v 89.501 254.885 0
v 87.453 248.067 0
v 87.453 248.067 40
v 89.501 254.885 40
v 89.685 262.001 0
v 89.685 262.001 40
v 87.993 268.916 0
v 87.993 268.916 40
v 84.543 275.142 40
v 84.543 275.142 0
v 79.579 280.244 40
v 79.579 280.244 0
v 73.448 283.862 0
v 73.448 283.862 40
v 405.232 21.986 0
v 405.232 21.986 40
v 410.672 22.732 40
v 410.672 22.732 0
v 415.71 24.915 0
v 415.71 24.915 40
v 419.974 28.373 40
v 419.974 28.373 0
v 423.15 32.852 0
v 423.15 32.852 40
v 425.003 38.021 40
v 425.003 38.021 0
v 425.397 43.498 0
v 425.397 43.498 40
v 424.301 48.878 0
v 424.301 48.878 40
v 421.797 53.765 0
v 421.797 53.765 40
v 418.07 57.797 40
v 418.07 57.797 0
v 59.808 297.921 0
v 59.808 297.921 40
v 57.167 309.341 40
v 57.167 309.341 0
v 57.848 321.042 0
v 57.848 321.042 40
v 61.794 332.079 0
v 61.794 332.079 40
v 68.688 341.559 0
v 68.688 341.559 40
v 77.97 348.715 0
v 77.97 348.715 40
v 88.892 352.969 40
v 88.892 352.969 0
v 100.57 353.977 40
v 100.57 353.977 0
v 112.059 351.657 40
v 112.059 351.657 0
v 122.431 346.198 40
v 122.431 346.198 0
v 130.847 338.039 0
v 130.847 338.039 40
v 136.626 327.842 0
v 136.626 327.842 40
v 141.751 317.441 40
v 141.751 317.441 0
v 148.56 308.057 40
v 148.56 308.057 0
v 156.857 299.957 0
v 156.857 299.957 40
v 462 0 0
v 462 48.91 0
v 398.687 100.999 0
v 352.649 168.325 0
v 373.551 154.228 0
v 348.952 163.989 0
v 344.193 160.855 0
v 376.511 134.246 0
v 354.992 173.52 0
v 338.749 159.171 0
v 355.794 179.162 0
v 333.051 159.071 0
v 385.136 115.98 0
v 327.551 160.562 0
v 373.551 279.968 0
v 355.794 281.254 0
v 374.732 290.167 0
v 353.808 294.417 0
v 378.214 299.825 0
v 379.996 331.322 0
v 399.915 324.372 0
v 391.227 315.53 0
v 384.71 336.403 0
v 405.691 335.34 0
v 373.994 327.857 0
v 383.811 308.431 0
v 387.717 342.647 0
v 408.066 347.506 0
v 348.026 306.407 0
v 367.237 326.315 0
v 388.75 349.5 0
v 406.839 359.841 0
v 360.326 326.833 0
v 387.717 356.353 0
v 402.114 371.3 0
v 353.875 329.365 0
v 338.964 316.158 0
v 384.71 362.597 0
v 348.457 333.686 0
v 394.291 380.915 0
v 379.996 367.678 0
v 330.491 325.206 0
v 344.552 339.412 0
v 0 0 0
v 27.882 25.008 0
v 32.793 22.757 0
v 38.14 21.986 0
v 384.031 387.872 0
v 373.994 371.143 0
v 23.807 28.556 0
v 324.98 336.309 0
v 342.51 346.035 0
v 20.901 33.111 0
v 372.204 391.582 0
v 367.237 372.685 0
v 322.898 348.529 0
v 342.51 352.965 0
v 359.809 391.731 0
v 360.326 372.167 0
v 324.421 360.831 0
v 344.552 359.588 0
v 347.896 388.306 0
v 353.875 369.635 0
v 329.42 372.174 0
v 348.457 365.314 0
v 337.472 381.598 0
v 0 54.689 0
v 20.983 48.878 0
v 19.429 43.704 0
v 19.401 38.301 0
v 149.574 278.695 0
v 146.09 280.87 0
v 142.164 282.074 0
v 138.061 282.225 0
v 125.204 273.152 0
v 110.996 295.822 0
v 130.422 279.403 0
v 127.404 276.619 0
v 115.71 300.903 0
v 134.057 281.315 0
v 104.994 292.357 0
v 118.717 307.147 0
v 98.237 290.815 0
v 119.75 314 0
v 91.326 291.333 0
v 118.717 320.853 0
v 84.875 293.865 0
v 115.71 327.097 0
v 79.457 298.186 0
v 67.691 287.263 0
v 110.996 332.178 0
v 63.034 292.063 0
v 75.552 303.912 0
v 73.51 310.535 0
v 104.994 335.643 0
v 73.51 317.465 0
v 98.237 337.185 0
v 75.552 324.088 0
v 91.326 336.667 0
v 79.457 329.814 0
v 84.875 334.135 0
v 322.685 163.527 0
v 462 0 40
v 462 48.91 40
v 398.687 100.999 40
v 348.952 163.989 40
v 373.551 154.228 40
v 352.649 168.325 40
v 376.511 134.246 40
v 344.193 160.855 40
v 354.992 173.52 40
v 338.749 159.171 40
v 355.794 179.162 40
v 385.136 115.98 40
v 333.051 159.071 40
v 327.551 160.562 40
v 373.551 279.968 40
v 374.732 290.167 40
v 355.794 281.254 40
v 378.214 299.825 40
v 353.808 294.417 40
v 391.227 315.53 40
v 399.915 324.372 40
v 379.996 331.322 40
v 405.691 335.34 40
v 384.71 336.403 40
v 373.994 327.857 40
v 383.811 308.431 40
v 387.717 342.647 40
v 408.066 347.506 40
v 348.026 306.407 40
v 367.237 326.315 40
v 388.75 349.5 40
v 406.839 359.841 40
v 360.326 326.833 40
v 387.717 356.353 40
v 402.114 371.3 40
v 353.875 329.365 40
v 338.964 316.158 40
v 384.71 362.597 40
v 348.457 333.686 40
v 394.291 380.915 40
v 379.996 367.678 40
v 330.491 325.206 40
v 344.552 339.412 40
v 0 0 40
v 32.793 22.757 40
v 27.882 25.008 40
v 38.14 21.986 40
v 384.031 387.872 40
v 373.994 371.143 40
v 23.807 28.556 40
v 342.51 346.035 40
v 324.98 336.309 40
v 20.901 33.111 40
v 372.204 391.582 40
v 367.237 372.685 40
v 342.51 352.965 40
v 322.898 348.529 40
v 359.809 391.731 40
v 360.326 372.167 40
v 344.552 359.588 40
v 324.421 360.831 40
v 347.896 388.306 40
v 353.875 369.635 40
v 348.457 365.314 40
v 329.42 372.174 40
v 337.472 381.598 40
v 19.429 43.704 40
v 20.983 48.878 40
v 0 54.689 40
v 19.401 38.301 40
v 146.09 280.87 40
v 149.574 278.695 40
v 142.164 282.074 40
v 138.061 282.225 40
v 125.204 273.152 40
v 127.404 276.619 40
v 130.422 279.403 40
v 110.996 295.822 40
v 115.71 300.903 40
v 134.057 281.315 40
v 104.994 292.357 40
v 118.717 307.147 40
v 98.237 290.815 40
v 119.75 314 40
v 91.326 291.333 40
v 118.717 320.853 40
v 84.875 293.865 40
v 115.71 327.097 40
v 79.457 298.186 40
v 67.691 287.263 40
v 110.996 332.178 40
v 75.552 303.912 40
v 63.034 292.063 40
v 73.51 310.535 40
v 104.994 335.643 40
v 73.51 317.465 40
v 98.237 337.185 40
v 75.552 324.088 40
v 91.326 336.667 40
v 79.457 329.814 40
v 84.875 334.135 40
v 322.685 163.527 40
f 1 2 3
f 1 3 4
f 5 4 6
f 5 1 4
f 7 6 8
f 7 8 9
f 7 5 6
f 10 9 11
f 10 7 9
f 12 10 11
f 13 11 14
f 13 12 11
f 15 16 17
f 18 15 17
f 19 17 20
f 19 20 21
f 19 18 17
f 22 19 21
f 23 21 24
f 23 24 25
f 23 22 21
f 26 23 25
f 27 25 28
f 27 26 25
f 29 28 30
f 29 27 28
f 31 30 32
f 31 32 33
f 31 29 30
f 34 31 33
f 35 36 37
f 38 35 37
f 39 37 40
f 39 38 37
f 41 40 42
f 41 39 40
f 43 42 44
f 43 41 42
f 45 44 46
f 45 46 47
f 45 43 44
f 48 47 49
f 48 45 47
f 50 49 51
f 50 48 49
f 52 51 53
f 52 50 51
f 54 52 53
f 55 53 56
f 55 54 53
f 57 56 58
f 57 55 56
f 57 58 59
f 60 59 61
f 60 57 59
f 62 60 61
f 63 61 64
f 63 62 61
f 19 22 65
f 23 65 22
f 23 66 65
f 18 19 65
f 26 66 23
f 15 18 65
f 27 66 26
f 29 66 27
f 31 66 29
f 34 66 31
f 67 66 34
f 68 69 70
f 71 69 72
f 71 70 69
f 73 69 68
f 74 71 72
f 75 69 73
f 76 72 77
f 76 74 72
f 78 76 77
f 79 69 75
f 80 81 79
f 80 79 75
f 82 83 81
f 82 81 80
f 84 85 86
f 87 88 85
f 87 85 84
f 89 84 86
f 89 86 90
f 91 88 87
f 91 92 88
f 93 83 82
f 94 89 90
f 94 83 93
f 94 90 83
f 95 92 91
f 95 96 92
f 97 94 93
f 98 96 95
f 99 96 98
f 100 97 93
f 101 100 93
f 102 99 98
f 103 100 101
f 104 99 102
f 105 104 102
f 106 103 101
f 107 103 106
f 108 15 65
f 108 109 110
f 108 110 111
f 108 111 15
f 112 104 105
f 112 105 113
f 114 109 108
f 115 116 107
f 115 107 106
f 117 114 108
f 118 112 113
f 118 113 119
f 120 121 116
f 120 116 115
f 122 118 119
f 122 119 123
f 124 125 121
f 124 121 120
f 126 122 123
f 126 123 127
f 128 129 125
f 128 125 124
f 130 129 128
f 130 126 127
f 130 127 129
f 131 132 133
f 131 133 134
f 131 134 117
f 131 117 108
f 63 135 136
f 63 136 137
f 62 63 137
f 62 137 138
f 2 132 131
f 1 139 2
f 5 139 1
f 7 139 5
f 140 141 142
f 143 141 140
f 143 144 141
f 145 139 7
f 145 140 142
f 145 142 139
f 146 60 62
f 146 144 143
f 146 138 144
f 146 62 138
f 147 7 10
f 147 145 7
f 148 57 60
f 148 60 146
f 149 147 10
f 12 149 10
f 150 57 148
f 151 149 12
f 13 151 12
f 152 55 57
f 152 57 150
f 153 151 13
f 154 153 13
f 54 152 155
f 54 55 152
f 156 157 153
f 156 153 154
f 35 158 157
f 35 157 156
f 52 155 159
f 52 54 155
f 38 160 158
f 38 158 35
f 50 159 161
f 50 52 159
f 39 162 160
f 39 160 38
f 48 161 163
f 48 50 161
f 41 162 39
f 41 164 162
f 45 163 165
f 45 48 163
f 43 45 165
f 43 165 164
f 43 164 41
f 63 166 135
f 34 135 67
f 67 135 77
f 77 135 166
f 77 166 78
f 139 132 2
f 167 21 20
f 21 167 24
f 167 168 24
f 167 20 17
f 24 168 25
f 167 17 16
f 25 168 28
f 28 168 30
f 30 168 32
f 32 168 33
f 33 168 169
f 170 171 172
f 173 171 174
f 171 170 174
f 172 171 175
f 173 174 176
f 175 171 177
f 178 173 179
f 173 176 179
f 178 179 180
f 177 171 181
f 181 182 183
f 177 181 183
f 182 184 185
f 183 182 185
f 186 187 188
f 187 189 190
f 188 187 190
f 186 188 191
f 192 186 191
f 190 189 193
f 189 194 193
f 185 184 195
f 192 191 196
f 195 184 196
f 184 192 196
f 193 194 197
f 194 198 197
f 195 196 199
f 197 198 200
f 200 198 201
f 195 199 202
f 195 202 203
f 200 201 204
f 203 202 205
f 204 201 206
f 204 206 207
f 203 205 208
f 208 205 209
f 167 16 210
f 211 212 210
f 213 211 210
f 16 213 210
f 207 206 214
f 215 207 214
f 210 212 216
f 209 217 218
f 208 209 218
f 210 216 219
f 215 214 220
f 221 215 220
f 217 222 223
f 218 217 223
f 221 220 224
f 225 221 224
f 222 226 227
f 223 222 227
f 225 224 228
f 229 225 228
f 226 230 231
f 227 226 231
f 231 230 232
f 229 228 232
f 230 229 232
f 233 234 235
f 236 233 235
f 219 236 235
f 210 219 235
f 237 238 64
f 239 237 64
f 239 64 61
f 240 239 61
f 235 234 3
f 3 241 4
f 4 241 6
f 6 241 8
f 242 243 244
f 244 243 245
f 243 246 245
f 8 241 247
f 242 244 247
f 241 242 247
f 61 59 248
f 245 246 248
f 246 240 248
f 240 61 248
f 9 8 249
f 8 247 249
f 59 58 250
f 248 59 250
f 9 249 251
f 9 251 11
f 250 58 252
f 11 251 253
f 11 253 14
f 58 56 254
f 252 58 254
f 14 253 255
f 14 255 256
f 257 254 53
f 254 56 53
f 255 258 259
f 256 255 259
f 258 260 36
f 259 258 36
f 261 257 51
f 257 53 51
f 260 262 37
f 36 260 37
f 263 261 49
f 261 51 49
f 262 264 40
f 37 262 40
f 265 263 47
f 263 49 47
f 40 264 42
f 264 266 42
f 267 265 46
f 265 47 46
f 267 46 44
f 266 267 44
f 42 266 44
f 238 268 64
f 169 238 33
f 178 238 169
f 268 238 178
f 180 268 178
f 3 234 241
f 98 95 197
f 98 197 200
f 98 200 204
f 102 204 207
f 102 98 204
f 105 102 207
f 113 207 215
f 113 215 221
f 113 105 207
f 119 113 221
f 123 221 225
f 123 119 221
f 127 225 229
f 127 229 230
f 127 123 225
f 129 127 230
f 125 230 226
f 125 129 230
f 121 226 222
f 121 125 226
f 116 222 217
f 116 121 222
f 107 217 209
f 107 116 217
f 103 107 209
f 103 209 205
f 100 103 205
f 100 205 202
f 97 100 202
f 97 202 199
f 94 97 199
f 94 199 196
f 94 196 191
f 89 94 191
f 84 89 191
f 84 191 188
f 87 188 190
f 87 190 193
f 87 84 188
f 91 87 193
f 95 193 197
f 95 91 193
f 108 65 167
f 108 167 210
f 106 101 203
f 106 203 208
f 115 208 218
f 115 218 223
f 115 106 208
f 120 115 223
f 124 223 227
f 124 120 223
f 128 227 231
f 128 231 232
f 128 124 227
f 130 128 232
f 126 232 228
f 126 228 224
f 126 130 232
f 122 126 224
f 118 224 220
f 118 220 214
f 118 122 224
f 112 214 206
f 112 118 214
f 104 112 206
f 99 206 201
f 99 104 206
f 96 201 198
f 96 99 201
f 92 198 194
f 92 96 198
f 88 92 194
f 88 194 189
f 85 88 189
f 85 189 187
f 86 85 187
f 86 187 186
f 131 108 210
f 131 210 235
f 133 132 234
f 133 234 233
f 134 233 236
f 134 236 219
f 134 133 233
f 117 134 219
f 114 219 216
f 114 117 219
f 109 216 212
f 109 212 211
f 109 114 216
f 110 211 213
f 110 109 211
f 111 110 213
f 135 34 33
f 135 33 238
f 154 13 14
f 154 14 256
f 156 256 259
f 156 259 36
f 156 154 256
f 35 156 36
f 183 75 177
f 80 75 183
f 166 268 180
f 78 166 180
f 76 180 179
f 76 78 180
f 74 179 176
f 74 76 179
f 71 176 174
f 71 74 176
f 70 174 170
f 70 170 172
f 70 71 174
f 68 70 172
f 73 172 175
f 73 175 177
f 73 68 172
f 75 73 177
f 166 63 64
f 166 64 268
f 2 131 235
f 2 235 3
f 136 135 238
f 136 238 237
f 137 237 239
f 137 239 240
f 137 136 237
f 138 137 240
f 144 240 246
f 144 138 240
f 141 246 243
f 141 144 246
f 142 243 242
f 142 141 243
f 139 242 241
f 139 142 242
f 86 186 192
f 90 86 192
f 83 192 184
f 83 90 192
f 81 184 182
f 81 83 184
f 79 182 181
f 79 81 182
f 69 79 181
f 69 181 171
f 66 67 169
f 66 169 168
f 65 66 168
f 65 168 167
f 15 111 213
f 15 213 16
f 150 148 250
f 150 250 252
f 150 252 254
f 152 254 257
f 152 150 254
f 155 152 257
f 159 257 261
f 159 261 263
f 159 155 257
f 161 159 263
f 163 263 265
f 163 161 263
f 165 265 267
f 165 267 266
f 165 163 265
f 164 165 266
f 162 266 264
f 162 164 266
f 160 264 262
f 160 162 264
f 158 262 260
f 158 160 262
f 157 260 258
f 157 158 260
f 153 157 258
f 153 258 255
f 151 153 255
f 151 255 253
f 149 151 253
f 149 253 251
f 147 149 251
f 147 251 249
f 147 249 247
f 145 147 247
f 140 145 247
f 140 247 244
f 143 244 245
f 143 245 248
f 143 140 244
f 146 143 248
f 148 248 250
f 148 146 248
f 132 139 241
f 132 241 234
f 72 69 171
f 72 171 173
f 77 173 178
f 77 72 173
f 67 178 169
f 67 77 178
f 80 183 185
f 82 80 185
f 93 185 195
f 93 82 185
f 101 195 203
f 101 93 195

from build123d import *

# Parameters (mm, degrees)
SZKIC2_R                    = 23.25
DODANIE_WYCI_GNI_CIE2_DEPTH = 40


with BuildPart() as part:
    # Szkic2 → Dodanie-wyciągnięcie2 (new body)
    with BuildSketch(Plane.XY):
        with BuildLine():
            Line((0, 0), (0, 54.688934957))
            Line((0, 54.688934957), (87.453362302, 248.067468892))
            ThreePointArc((87.453362302, 248.067468892), (87.993040755, 268.91551183), (73.44838199, 283.861583171))
            ThreePointArc((73.44838199, 283.861583171), (65.201876961, 289.507605405), (59.808019866, 297.921208552))
            ThreePointArc((59.808019866, 297.921208552), (83.279468744, 351.232430567), (136.626207071, 327.841816741))
            ThreePointArc((136.626207071, 327.841816741), (144.956248443, 312.604323506), (156.856823864, 299.957304331))
            Line((156.856823864, 299.957304331), (322.684534721, 163.527324946))
            ThreePointArc((322.684534721, 163.527324946), (344.192875478, 160.854554943), (355.793873119, 179.162183827))
            Line((355.793873119, 179.162183827), (355.793873119, 281.253729426))
            ThreePointArc((355.793873119, 281.253729426), (351.366678921, 300.628861995), (338.963821807, 316.158348333))
            ThreePointArc((338.963821807, 316.158348333), (366.011924038, 392.109534411), (391.227480575, 315.530436679))
            ThreePointArc((391.227480575, 315.530436679), (378.213678028, 299.824941516), (373.550822068, 279.968471302))
            Line((373.550822068, 279.968471302), (373.550822068, 154.228140368))
            ThreePointArc((373.550822068, 154.228140368), (380.150790995, 124.795180873), (398.686800685, 100.998646686))
            Line((398.686800685, 100.998646686), (462, 48.909533035))
            Line((462, 48.909533035), (462, 0))
            Line((462, 0), (0, 0))
        make_face()
        with Locations((96.5, 314)):
            Circle(SZKIC2_R, mode=Mode.SUBTRACT)
        with Locations((365.5, 349.5)):
            Circle(SZKIC2_R, mode=Mode.SUBTRACT)
        with BuildLine():
            Line((38.140490442, 21.985652154), (405.231641072, 21.985652154))
            ThreePointArc((405.231641072, 21.985652154), (424.253349591, 35.373578819), (418.06991605, 57.797385924))
            Line((418.06991605, 57.797385924), (149.573518435, 278.695074266))
            ThreePointArc((149.573518435, 278.695074266), (136.029024136, 281.900539629), (125.203881252, 273.151561656))
            Line((125.203881252, 273.151561656), (20.983248041, 48.87798069))
            ThreePointArc((20.983248041, 48.87798069), (22.19081724, 30.72910257), (38.140490442, 21.985652154))
        make_face(mode=Mode.SUBTRACT)
    extrude(amount=DODANIE_WYCI_GNI_CIE2_DEPTH)


solid = part.part
